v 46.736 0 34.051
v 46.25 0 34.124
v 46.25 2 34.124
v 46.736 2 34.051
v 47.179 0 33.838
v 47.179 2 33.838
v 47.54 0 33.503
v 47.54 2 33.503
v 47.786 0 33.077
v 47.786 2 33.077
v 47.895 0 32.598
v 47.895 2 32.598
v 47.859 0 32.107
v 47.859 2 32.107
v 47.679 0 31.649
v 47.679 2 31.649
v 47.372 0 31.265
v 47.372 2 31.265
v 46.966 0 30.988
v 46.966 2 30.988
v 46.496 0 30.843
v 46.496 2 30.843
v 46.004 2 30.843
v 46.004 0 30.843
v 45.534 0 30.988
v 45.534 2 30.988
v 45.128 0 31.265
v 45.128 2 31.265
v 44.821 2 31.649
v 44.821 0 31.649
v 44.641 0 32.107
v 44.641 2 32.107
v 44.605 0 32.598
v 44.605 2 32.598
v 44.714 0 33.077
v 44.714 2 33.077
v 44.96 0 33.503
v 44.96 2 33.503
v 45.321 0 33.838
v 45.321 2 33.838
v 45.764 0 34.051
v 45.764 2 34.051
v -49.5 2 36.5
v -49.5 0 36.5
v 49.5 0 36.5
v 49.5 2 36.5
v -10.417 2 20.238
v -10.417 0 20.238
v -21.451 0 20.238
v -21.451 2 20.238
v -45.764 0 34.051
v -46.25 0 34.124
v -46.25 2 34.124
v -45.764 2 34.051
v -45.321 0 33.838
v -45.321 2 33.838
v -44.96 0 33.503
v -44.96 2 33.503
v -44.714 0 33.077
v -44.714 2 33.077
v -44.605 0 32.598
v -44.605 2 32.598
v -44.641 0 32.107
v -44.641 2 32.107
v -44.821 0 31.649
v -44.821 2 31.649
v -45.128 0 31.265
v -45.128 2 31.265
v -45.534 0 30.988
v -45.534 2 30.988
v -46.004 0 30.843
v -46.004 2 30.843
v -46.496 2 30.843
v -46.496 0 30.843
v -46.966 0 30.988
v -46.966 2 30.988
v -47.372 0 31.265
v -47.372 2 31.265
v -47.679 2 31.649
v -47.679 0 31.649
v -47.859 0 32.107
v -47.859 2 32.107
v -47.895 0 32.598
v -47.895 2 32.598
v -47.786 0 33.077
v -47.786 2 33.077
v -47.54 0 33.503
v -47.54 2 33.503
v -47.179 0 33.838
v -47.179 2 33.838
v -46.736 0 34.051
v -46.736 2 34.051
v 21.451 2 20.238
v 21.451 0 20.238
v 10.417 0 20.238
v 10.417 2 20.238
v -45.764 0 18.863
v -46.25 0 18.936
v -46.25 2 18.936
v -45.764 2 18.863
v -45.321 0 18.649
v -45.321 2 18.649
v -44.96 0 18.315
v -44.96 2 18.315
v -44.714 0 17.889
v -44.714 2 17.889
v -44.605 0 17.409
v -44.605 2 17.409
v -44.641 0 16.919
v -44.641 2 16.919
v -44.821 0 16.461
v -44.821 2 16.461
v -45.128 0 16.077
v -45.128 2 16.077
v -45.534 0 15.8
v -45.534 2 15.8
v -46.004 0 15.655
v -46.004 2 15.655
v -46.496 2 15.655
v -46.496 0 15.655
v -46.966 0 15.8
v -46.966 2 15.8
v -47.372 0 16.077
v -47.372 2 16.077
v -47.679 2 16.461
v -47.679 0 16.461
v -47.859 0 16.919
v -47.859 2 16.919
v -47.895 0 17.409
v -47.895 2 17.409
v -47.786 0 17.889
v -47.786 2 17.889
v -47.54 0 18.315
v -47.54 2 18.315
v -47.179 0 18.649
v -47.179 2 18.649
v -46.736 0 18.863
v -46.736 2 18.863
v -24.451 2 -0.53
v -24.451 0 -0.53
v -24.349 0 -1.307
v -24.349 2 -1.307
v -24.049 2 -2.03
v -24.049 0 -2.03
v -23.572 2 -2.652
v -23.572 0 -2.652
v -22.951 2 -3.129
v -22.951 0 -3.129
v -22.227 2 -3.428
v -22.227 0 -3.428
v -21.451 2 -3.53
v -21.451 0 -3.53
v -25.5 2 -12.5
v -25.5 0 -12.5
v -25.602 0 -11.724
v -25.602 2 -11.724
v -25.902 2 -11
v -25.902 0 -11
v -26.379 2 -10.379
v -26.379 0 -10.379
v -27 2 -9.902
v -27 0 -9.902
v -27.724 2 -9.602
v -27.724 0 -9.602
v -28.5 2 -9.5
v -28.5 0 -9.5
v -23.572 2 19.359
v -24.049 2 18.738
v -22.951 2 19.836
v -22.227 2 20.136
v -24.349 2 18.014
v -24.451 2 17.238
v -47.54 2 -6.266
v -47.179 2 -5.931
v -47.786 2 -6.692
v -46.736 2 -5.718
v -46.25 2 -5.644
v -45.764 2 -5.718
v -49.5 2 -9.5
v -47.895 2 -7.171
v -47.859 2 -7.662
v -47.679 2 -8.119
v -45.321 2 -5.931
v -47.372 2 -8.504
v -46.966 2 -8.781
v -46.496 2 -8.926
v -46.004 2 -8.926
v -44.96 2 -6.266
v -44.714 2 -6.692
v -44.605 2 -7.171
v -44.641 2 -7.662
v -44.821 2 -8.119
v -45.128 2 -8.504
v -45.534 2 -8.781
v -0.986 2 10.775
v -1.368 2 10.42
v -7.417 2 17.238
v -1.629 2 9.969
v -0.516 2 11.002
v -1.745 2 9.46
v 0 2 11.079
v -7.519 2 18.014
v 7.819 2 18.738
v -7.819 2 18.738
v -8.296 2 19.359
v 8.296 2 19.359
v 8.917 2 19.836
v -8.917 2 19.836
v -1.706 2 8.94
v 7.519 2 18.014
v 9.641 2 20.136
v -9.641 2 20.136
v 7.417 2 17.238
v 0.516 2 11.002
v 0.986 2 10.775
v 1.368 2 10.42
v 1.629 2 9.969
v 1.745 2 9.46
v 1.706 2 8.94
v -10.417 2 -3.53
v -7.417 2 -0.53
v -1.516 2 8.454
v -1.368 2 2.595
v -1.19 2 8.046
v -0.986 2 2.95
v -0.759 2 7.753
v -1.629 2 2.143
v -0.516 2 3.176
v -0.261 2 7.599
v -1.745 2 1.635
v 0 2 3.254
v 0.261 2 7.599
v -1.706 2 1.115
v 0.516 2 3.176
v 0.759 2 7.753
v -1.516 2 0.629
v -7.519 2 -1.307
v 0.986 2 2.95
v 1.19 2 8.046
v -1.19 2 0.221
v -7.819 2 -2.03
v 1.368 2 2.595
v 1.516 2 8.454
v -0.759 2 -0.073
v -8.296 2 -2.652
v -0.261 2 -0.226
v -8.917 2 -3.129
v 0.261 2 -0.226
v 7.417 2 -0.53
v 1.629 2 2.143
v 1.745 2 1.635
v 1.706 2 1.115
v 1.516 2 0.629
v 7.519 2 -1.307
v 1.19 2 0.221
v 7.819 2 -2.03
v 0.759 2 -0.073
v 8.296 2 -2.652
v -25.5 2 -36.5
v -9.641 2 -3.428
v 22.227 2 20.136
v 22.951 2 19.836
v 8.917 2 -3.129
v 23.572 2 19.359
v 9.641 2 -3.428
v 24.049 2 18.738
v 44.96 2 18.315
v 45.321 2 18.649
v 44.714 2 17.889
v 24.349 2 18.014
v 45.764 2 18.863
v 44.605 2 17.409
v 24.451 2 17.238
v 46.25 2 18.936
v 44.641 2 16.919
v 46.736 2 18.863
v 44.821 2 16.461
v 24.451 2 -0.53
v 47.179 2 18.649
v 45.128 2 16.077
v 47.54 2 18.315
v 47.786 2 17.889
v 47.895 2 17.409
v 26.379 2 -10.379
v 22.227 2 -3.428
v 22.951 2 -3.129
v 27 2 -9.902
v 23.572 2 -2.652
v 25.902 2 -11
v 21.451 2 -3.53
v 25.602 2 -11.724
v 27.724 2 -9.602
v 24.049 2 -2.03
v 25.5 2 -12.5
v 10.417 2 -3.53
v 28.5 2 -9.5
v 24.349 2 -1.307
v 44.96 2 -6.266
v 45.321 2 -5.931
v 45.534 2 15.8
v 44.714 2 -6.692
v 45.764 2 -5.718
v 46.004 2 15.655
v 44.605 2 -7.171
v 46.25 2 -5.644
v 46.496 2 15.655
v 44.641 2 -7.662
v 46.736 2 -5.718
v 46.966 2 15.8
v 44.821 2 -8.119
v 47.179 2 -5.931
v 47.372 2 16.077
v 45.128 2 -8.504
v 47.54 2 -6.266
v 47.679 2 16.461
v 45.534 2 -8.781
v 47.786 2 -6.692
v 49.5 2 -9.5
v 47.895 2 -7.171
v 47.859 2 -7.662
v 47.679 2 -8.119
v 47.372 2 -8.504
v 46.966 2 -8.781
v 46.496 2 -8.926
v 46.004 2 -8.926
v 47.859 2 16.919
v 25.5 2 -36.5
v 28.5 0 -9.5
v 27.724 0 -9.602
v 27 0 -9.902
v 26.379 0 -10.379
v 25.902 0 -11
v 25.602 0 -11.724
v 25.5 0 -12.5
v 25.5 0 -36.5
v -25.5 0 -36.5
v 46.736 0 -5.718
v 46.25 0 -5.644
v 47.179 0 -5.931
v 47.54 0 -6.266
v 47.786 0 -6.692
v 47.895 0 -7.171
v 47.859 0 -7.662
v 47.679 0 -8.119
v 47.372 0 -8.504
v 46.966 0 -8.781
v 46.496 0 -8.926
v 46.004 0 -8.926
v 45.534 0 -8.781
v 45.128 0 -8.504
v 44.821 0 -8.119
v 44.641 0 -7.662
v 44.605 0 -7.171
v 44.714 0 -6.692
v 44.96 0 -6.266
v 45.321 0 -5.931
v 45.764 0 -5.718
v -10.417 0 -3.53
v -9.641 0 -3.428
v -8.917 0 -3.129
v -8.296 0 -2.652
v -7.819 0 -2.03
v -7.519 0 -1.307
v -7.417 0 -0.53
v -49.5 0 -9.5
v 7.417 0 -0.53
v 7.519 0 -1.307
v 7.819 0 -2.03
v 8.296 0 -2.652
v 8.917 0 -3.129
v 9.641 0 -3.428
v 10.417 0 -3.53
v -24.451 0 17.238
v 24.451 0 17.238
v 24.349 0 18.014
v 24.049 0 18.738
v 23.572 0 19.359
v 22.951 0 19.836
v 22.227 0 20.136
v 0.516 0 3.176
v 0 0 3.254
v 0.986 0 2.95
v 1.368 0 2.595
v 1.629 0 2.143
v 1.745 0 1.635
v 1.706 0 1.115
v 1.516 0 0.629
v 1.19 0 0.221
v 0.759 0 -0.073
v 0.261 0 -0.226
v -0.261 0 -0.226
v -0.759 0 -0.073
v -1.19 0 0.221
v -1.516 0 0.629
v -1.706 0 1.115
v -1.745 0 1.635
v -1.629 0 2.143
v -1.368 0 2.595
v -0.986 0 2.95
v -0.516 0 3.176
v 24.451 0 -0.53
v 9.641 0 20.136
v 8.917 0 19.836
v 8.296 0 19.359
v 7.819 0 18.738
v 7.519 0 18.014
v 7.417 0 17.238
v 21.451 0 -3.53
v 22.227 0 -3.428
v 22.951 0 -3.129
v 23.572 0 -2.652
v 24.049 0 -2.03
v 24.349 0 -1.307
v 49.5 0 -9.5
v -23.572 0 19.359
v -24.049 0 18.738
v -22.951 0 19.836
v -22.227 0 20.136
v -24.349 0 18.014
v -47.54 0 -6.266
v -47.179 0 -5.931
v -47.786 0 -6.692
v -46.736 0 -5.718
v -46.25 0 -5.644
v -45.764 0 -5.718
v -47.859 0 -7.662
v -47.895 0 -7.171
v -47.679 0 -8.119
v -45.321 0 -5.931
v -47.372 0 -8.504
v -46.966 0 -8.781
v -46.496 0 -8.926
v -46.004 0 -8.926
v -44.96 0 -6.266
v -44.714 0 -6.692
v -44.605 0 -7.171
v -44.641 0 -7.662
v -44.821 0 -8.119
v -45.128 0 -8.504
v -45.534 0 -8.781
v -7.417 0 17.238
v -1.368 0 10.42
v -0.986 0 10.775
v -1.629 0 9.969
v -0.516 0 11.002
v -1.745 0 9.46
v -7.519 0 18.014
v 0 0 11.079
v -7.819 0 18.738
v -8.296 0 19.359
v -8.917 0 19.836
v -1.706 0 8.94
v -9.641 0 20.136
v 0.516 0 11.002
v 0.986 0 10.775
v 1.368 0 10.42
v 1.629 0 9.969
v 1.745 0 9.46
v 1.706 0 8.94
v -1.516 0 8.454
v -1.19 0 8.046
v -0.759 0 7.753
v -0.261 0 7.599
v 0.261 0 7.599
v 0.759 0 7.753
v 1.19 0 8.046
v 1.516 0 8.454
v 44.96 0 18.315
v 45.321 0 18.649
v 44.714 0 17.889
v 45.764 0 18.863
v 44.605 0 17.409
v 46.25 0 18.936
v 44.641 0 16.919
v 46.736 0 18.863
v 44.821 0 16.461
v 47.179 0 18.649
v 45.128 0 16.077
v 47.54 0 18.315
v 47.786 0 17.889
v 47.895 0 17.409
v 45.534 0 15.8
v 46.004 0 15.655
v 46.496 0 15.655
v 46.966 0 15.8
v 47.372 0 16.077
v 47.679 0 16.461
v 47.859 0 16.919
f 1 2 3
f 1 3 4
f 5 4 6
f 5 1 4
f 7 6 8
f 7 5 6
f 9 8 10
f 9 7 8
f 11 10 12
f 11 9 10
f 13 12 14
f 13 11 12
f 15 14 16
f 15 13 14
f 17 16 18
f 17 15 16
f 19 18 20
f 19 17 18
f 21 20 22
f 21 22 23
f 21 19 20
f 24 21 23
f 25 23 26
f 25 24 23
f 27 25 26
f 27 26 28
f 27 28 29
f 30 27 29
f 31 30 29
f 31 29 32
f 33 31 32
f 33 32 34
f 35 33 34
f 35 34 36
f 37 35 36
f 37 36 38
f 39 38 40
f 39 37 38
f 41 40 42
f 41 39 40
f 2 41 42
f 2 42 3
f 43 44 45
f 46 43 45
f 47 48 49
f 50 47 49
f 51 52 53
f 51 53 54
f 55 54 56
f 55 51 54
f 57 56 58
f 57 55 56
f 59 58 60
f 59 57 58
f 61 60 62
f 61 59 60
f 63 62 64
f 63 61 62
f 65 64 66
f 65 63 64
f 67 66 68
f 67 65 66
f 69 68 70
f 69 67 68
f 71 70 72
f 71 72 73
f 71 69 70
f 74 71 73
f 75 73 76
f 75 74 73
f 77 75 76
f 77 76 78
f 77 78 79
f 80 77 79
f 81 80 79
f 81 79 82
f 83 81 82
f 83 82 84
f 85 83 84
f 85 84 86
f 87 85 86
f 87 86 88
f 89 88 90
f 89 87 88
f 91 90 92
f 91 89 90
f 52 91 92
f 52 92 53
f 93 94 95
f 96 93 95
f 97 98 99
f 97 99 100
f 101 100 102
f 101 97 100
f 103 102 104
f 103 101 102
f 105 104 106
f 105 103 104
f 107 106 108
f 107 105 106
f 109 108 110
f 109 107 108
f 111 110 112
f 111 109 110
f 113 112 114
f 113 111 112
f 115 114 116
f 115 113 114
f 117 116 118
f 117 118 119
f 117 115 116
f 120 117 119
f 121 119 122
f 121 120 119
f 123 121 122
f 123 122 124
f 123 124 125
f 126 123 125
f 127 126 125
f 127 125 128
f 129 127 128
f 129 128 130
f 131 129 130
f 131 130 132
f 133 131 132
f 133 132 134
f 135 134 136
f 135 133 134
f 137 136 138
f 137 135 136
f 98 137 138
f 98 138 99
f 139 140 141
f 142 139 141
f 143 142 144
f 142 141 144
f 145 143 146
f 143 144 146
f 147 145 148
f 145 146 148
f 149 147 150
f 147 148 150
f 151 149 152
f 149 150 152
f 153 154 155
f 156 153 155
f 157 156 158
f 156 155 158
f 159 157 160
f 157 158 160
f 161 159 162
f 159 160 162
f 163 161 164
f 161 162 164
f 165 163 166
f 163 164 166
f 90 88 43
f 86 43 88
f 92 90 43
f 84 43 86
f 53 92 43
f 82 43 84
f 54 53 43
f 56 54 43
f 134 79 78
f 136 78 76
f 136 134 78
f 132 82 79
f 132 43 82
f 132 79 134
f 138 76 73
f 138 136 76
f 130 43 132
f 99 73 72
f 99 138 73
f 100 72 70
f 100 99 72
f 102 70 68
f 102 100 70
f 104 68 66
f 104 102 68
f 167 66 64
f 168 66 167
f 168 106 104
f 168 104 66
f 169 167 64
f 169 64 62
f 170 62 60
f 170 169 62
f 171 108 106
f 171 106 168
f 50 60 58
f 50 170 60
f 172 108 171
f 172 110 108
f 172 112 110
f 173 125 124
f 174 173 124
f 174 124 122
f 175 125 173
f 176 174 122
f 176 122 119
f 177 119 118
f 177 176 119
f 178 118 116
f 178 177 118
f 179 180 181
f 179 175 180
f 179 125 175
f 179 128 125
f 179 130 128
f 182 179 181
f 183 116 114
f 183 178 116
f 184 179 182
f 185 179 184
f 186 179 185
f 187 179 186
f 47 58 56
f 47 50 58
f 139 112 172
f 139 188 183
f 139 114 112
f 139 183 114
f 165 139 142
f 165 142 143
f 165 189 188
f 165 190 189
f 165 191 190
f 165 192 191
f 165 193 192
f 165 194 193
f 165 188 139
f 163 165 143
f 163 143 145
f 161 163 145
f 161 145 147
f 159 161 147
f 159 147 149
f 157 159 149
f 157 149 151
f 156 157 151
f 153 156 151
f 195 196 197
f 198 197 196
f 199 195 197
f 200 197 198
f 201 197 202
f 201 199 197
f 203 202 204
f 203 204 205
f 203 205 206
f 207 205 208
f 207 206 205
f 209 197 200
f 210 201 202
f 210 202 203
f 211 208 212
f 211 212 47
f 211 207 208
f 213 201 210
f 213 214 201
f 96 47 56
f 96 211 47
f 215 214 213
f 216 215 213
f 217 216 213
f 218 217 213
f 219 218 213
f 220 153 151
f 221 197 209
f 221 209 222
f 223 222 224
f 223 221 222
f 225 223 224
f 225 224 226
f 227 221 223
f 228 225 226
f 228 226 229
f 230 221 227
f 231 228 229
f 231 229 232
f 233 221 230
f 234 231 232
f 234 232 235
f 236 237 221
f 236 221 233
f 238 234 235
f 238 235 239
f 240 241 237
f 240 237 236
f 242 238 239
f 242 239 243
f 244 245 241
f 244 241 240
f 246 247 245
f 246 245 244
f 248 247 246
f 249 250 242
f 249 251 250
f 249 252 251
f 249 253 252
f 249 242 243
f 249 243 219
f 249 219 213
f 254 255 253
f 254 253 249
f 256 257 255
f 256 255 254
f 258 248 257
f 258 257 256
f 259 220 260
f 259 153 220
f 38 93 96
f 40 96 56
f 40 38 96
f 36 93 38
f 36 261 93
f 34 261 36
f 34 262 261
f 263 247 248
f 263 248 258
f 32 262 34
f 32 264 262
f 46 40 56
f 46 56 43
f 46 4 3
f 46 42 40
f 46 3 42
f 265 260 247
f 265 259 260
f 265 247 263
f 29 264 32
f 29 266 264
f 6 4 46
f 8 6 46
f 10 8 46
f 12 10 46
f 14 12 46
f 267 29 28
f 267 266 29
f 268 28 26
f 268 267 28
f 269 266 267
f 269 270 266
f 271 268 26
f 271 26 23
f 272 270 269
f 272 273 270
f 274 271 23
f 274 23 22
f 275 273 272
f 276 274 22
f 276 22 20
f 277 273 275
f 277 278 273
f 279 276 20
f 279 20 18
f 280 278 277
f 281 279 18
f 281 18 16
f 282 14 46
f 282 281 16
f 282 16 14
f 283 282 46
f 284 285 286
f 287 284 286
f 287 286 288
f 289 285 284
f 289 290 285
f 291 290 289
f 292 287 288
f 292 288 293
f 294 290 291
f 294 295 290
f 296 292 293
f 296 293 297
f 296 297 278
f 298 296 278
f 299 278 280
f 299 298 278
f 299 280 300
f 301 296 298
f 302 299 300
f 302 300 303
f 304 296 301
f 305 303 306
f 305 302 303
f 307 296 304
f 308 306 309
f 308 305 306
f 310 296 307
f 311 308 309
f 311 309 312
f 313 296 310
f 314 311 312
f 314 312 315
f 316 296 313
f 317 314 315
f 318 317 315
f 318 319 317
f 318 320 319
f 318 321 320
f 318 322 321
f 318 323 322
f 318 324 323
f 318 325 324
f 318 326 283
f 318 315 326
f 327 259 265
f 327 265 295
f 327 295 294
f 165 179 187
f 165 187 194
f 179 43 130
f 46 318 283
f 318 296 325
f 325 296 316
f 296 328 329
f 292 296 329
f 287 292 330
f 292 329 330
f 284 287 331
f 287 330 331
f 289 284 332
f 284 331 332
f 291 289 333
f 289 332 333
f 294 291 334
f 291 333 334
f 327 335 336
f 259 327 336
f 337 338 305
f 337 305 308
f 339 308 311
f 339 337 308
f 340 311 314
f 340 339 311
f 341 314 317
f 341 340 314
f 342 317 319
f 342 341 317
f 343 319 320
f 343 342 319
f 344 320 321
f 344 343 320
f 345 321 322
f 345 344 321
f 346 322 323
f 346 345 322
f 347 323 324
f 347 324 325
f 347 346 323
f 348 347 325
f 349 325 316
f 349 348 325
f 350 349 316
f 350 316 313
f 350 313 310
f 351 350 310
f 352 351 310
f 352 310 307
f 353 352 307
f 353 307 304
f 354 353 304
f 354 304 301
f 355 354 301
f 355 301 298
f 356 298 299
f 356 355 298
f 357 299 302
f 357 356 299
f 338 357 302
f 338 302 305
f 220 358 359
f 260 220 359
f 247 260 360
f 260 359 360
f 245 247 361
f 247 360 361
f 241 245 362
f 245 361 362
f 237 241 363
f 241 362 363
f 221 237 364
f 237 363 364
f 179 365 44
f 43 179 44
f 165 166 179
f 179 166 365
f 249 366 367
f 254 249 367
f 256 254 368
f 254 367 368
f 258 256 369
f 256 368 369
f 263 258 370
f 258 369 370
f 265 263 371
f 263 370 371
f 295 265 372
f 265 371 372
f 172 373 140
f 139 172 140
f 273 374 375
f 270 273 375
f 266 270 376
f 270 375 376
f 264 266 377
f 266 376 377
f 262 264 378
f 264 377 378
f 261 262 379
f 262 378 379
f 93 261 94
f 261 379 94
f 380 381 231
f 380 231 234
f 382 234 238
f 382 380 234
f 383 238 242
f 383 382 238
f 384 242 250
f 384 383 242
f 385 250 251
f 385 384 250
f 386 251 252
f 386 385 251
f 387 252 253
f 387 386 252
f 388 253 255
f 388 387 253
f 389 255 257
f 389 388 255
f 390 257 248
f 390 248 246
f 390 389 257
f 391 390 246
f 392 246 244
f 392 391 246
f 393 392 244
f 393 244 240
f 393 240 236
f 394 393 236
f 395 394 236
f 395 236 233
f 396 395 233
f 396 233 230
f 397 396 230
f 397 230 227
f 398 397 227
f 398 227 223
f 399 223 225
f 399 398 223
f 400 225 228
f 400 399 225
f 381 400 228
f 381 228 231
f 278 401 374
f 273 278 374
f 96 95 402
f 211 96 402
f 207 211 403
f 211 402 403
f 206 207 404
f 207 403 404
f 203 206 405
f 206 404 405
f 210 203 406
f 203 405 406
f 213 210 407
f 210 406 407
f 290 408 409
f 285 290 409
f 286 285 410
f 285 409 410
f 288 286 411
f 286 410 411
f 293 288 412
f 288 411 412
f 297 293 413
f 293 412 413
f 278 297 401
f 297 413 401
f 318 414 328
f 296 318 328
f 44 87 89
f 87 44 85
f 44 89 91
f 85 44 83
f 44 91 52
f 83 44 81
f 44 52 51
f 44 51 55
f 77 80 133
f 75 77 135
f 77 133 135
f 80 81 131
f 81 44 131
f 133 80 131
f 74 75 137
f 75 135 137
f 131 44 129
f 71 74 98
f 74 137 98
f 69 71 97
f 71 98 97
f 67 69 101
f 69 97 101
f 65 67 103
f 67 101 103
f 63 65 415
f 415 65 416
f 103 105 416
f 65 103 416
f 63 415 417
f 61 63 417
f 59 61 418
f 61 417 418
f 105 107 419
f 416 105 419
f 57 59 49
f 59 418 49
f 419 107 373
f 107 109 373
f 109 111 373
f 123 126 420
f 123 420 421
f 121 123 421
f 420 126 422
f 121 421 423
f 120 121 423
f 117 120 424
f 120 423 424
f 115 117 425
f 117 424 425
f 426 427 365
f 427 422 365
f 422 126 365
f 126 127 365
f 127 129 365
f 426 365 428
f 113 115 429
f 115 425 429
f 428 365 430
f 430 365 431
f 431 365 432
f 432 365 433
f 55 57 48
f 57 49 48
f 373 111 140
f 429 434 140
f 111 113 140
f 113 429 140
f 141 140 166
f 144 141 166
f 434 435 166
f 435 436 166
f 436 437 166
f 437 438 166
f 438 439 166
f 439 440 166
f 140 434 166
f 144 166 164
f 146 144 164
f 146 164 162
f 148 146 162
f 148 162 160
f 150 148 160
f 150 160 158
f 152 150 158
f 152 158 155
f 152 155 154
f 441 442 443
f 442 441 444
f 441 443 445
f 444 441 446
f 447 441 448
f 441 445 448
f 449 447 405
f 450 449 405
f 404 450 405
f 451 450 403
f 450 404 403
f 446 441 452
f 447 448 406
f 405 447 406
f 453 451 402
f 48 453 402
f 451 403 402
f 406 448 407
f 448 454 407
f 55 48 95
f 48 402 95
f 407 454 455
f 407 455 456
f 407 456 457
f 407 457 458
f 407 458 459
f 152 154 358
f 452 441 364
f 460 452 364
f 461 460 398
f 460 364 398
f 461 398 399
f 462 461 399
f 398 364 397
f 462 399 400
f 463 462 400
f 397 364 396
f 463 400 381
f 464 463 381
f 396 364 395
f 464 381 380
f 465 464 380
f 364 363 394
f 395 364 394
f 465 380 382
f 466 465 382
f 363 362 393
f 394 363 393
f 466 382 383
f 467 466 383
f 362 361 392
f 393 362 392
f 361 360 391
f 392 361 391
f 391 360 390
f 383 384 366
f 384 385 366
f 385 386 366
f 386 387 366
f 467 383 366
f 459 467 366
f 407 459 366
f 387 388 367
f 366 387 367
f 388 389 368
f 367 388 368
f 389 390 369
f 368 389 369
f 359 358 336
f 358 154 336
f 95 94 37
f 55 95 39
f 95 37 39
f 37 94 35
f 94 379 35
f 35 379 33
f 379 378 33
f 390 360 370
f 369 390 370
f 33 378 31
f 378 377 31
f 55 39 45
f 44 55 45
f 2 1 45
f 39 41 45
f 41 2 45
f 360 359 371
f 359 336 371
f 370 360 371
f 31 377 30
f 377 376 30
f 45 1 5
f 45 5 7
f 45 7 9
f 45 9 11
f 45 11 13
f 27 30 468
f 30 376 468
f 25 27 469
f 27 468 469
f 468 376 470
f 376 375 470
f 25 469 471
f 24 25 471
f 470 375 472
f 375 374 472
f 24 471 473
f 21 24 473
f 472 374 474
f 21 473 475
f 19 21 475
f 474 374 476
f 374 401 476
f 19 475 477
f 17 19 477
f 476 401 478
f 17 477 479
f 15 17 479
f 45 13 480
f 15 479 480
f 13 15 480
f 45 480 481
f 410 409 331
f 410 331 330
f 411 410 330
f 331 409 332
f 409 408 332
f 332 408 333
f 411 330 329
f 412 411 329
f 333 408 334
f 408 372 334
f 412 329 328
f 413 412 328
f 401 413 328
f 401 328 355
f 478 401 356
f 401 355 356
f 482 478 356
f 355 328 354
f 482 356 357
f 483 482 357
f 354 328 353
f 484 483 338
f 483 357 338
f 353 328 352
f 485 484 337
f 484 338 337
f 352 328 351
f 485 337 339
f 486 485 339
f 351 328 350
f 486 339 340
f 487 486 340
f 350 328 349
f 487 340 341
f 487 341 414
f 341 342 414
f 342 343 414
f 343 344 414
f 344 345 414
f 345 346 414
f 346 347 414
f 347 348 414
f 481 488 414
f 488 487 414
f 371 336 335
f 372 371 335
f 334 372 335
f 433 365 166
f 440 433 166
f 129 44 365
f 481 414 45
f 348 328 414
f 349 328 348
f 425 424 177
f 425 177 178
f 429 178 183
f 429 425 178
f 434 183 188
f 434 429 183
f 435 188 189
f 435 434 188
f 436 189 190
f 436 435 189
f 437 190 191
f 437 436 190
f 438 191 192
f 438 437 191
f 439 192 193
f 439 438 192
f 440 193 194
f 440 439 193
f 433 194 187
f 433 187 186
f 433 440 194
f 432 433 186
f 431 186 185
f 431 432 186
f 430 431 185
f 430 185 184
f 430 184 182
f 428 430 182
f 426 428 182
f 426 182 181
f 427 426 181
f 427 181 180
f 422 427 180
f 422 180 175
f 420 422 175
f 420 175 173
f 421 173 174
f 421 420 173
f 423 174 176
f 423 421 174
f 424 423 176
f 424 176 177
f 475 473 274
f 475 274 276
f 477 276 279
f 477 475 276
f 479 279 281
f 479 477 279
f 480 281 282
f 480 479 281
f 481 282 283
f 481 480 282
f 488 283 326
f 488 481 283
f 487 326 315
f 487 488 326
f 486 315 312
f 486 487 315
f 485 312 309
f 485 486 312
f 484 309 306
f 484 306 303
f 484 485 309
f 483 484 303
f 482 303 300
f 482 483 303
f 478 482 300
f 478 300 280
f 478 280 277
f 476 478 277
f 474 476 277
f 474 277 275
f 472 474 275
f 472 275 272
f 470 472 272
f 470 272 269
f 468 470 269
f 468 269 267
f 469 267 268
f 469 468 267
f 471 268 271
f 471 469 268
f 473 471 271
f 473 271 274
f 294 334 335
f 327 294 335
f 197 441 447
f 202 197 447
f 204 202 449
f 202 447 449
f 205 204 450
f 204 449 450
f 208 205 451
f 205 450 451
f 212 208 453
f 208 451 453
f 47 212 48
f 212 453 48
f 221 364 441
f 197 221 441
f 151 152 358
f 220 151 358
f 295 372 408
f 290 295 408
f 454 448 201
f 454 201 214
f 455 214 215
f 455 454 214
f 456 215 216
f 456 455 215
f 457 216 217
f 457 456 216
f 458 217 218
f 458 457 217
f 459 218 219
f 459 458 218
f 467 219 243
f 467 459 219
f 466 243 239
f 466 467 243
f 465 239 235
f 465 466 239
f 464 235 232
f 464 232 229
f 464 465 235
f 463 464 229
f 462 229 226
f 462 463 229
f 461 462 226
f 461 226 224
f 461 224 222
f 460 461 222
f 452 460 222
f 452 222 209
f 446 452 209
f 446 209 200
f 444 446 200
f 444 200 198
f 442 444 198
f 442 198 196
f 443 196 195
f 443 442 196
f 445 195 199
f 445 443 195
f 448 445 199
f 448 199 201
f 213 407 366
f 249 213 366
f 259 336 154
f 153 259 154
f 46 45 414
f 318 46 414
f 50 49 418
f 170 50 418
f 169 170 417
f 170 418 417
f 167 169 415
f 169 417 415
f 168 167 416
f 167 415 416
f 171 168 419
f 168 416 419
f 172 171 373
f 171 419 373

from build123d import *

# Parameters (mm, degrees)
CROQUIS1_R              = 1.65
CROQUIS1_R_2            = 1.75
SALIENTE_EXTRUIR1_DEPTH = 2


with BuildPart() as part:
    # Croquis1 → Saliente-Extruir1 (new body)
    with BuildSketch(Plane(origin=(0, 0, 0), x_dir=(1, 0, 0), z_dir=(0, 1, 0))):
        with BuildLine():
            Line((-28.5, 9.5), (-49.5, 9.5))
            Line((-49.5, 9.5), (-49.5, -36.5))
            Line((-49.5, -36.5), (49.5, -36.5))
            Line((49.5, -36.5), (49.5, 9.5))
            Line((49.5, 9.5), (28.5, 9.5))
            ThreePointArc((28.5, 9.5), (26.378679656, 10.378679656), (25.5, 12.5))
            Line((25.5, 12.5), (25.5, 36.5))
            Line((25.5, 36.5), (-25.5, 36.5))
            Line((-25.5, 36.5), (-25.5, 12.5))
            ThreePointArc((-25.5, 12.5), (-26.378679656, 10.378679656), (-28.5, 9.5))
        make_face()
        with Locations(Location((-46.25, -32.474277755, 0), (0, 0, 270))):
            Circle(CROQUIS1_R, mode=Mode.SUBTRACT)
        with Locations(Location((-46.25, -17.286108292, 0), (0, 0, 270))):
            Circle(CROQUIS1_R, mode=Mode.SUBTRACT)
        with Locations(Location((0, -9.329285485, 0), (0, 0, 270))):
            Circle(CROQUIS1_R_2, mode=Mode.SUBTRACT)
        with BuildLine():
            ThreePointArc((-10.417011027, 3.530475001), (-8.295690684, 2.651795344), (-7.417011027, 0.530475001))
            Line((-7.417011027, 0.530475001), (-7.417011027, -17.238029314))
            ThreePointArc((-7.417011027, -17.238029314), (-8.295690684, -19.359349658), (-10.417011027, -20.238029314))
            Line((-10.417011027, -20.238029314), (-21.450841414, -20.238029314))
            ThreePointArc((-21.450841414, -20.238029314), (-23.572161757, -19.359349658), (-24.450841414, -17.238029314))
            Line((-24.450841414, -17.238029314), (-24.450841414, 0.530475001))
            ThreePointArc((-24.450841414, 0.530475001), (-23.572161757, 2.651795344), (-21.450841414, 3.530475001))
            Line((-21.450841414, 3.530475001), (-10.417011027, 3.530475001))
        make_face(mode=Mode.SUBTRACT)
        with Locations(Location((0, -1.504051409, 0), (0, 0, 270))):
            Circle(CROQUIS1_R_2, mode=Mode.SUBTRACT)
        with Locations(Location((46.25, -32.474277755, 0), (0, 0, 270))):
            Circle(CROQUIS1_R, mode=Mode.SUBTRACT)
        with BuildLine():
            Line((10.417011027, 3.530475001), (21.450841414, 3.530475001))
            ThreePointArc((21.450841414, 3.530475001), (23.572161757, 2.651795344), (24.450841414, 0.530475001))
            Line((24.450841414, 0.530475001), (24.450841414, -17.238029314))
            ThreePointArc((24.450841414, -17.238029314), (23.572161757, -19.359349658), (21.450841414, -20.238029314))
            Line((21.450841414, -20.238029314), (10.417011027, -20.238029314))
            ThreePointArc((10.417011027, -20.238029314), (8.295690684, -19.359349658), (7.417011027, -17.238029314))
            Line((7.417011027, -17.238029314), (7.417011027, 0.530475001))
            ThreePointArc((7.417011027, 0.530475001), (8.295690684, 2.651795344), (10.417011027, 3.530475001))
        make_face(mode=Mode.SUBTRACT)
        with Locations(Location((46.25, -17.286108292, 0), (0, 0, 270))):
            Circle(CROQUIS1_R, mode=Mode.SUBTRACT)
        with Locations(Location((-46.25, 7.294463352, 0), (0, 0, 270))):
            Circle(CROQUIS1_R, mode=Mode.SUBTRACT)
        with Locations(Location((46.25, 7.294463352, 0), (0, 0, 270))):
            Circle(CROQUIS1_R, mode=Mode.SUBTRACT)
    extrude(amount=SALIENTE_EXTRUIR1_DEPTH)


solid = part.part
